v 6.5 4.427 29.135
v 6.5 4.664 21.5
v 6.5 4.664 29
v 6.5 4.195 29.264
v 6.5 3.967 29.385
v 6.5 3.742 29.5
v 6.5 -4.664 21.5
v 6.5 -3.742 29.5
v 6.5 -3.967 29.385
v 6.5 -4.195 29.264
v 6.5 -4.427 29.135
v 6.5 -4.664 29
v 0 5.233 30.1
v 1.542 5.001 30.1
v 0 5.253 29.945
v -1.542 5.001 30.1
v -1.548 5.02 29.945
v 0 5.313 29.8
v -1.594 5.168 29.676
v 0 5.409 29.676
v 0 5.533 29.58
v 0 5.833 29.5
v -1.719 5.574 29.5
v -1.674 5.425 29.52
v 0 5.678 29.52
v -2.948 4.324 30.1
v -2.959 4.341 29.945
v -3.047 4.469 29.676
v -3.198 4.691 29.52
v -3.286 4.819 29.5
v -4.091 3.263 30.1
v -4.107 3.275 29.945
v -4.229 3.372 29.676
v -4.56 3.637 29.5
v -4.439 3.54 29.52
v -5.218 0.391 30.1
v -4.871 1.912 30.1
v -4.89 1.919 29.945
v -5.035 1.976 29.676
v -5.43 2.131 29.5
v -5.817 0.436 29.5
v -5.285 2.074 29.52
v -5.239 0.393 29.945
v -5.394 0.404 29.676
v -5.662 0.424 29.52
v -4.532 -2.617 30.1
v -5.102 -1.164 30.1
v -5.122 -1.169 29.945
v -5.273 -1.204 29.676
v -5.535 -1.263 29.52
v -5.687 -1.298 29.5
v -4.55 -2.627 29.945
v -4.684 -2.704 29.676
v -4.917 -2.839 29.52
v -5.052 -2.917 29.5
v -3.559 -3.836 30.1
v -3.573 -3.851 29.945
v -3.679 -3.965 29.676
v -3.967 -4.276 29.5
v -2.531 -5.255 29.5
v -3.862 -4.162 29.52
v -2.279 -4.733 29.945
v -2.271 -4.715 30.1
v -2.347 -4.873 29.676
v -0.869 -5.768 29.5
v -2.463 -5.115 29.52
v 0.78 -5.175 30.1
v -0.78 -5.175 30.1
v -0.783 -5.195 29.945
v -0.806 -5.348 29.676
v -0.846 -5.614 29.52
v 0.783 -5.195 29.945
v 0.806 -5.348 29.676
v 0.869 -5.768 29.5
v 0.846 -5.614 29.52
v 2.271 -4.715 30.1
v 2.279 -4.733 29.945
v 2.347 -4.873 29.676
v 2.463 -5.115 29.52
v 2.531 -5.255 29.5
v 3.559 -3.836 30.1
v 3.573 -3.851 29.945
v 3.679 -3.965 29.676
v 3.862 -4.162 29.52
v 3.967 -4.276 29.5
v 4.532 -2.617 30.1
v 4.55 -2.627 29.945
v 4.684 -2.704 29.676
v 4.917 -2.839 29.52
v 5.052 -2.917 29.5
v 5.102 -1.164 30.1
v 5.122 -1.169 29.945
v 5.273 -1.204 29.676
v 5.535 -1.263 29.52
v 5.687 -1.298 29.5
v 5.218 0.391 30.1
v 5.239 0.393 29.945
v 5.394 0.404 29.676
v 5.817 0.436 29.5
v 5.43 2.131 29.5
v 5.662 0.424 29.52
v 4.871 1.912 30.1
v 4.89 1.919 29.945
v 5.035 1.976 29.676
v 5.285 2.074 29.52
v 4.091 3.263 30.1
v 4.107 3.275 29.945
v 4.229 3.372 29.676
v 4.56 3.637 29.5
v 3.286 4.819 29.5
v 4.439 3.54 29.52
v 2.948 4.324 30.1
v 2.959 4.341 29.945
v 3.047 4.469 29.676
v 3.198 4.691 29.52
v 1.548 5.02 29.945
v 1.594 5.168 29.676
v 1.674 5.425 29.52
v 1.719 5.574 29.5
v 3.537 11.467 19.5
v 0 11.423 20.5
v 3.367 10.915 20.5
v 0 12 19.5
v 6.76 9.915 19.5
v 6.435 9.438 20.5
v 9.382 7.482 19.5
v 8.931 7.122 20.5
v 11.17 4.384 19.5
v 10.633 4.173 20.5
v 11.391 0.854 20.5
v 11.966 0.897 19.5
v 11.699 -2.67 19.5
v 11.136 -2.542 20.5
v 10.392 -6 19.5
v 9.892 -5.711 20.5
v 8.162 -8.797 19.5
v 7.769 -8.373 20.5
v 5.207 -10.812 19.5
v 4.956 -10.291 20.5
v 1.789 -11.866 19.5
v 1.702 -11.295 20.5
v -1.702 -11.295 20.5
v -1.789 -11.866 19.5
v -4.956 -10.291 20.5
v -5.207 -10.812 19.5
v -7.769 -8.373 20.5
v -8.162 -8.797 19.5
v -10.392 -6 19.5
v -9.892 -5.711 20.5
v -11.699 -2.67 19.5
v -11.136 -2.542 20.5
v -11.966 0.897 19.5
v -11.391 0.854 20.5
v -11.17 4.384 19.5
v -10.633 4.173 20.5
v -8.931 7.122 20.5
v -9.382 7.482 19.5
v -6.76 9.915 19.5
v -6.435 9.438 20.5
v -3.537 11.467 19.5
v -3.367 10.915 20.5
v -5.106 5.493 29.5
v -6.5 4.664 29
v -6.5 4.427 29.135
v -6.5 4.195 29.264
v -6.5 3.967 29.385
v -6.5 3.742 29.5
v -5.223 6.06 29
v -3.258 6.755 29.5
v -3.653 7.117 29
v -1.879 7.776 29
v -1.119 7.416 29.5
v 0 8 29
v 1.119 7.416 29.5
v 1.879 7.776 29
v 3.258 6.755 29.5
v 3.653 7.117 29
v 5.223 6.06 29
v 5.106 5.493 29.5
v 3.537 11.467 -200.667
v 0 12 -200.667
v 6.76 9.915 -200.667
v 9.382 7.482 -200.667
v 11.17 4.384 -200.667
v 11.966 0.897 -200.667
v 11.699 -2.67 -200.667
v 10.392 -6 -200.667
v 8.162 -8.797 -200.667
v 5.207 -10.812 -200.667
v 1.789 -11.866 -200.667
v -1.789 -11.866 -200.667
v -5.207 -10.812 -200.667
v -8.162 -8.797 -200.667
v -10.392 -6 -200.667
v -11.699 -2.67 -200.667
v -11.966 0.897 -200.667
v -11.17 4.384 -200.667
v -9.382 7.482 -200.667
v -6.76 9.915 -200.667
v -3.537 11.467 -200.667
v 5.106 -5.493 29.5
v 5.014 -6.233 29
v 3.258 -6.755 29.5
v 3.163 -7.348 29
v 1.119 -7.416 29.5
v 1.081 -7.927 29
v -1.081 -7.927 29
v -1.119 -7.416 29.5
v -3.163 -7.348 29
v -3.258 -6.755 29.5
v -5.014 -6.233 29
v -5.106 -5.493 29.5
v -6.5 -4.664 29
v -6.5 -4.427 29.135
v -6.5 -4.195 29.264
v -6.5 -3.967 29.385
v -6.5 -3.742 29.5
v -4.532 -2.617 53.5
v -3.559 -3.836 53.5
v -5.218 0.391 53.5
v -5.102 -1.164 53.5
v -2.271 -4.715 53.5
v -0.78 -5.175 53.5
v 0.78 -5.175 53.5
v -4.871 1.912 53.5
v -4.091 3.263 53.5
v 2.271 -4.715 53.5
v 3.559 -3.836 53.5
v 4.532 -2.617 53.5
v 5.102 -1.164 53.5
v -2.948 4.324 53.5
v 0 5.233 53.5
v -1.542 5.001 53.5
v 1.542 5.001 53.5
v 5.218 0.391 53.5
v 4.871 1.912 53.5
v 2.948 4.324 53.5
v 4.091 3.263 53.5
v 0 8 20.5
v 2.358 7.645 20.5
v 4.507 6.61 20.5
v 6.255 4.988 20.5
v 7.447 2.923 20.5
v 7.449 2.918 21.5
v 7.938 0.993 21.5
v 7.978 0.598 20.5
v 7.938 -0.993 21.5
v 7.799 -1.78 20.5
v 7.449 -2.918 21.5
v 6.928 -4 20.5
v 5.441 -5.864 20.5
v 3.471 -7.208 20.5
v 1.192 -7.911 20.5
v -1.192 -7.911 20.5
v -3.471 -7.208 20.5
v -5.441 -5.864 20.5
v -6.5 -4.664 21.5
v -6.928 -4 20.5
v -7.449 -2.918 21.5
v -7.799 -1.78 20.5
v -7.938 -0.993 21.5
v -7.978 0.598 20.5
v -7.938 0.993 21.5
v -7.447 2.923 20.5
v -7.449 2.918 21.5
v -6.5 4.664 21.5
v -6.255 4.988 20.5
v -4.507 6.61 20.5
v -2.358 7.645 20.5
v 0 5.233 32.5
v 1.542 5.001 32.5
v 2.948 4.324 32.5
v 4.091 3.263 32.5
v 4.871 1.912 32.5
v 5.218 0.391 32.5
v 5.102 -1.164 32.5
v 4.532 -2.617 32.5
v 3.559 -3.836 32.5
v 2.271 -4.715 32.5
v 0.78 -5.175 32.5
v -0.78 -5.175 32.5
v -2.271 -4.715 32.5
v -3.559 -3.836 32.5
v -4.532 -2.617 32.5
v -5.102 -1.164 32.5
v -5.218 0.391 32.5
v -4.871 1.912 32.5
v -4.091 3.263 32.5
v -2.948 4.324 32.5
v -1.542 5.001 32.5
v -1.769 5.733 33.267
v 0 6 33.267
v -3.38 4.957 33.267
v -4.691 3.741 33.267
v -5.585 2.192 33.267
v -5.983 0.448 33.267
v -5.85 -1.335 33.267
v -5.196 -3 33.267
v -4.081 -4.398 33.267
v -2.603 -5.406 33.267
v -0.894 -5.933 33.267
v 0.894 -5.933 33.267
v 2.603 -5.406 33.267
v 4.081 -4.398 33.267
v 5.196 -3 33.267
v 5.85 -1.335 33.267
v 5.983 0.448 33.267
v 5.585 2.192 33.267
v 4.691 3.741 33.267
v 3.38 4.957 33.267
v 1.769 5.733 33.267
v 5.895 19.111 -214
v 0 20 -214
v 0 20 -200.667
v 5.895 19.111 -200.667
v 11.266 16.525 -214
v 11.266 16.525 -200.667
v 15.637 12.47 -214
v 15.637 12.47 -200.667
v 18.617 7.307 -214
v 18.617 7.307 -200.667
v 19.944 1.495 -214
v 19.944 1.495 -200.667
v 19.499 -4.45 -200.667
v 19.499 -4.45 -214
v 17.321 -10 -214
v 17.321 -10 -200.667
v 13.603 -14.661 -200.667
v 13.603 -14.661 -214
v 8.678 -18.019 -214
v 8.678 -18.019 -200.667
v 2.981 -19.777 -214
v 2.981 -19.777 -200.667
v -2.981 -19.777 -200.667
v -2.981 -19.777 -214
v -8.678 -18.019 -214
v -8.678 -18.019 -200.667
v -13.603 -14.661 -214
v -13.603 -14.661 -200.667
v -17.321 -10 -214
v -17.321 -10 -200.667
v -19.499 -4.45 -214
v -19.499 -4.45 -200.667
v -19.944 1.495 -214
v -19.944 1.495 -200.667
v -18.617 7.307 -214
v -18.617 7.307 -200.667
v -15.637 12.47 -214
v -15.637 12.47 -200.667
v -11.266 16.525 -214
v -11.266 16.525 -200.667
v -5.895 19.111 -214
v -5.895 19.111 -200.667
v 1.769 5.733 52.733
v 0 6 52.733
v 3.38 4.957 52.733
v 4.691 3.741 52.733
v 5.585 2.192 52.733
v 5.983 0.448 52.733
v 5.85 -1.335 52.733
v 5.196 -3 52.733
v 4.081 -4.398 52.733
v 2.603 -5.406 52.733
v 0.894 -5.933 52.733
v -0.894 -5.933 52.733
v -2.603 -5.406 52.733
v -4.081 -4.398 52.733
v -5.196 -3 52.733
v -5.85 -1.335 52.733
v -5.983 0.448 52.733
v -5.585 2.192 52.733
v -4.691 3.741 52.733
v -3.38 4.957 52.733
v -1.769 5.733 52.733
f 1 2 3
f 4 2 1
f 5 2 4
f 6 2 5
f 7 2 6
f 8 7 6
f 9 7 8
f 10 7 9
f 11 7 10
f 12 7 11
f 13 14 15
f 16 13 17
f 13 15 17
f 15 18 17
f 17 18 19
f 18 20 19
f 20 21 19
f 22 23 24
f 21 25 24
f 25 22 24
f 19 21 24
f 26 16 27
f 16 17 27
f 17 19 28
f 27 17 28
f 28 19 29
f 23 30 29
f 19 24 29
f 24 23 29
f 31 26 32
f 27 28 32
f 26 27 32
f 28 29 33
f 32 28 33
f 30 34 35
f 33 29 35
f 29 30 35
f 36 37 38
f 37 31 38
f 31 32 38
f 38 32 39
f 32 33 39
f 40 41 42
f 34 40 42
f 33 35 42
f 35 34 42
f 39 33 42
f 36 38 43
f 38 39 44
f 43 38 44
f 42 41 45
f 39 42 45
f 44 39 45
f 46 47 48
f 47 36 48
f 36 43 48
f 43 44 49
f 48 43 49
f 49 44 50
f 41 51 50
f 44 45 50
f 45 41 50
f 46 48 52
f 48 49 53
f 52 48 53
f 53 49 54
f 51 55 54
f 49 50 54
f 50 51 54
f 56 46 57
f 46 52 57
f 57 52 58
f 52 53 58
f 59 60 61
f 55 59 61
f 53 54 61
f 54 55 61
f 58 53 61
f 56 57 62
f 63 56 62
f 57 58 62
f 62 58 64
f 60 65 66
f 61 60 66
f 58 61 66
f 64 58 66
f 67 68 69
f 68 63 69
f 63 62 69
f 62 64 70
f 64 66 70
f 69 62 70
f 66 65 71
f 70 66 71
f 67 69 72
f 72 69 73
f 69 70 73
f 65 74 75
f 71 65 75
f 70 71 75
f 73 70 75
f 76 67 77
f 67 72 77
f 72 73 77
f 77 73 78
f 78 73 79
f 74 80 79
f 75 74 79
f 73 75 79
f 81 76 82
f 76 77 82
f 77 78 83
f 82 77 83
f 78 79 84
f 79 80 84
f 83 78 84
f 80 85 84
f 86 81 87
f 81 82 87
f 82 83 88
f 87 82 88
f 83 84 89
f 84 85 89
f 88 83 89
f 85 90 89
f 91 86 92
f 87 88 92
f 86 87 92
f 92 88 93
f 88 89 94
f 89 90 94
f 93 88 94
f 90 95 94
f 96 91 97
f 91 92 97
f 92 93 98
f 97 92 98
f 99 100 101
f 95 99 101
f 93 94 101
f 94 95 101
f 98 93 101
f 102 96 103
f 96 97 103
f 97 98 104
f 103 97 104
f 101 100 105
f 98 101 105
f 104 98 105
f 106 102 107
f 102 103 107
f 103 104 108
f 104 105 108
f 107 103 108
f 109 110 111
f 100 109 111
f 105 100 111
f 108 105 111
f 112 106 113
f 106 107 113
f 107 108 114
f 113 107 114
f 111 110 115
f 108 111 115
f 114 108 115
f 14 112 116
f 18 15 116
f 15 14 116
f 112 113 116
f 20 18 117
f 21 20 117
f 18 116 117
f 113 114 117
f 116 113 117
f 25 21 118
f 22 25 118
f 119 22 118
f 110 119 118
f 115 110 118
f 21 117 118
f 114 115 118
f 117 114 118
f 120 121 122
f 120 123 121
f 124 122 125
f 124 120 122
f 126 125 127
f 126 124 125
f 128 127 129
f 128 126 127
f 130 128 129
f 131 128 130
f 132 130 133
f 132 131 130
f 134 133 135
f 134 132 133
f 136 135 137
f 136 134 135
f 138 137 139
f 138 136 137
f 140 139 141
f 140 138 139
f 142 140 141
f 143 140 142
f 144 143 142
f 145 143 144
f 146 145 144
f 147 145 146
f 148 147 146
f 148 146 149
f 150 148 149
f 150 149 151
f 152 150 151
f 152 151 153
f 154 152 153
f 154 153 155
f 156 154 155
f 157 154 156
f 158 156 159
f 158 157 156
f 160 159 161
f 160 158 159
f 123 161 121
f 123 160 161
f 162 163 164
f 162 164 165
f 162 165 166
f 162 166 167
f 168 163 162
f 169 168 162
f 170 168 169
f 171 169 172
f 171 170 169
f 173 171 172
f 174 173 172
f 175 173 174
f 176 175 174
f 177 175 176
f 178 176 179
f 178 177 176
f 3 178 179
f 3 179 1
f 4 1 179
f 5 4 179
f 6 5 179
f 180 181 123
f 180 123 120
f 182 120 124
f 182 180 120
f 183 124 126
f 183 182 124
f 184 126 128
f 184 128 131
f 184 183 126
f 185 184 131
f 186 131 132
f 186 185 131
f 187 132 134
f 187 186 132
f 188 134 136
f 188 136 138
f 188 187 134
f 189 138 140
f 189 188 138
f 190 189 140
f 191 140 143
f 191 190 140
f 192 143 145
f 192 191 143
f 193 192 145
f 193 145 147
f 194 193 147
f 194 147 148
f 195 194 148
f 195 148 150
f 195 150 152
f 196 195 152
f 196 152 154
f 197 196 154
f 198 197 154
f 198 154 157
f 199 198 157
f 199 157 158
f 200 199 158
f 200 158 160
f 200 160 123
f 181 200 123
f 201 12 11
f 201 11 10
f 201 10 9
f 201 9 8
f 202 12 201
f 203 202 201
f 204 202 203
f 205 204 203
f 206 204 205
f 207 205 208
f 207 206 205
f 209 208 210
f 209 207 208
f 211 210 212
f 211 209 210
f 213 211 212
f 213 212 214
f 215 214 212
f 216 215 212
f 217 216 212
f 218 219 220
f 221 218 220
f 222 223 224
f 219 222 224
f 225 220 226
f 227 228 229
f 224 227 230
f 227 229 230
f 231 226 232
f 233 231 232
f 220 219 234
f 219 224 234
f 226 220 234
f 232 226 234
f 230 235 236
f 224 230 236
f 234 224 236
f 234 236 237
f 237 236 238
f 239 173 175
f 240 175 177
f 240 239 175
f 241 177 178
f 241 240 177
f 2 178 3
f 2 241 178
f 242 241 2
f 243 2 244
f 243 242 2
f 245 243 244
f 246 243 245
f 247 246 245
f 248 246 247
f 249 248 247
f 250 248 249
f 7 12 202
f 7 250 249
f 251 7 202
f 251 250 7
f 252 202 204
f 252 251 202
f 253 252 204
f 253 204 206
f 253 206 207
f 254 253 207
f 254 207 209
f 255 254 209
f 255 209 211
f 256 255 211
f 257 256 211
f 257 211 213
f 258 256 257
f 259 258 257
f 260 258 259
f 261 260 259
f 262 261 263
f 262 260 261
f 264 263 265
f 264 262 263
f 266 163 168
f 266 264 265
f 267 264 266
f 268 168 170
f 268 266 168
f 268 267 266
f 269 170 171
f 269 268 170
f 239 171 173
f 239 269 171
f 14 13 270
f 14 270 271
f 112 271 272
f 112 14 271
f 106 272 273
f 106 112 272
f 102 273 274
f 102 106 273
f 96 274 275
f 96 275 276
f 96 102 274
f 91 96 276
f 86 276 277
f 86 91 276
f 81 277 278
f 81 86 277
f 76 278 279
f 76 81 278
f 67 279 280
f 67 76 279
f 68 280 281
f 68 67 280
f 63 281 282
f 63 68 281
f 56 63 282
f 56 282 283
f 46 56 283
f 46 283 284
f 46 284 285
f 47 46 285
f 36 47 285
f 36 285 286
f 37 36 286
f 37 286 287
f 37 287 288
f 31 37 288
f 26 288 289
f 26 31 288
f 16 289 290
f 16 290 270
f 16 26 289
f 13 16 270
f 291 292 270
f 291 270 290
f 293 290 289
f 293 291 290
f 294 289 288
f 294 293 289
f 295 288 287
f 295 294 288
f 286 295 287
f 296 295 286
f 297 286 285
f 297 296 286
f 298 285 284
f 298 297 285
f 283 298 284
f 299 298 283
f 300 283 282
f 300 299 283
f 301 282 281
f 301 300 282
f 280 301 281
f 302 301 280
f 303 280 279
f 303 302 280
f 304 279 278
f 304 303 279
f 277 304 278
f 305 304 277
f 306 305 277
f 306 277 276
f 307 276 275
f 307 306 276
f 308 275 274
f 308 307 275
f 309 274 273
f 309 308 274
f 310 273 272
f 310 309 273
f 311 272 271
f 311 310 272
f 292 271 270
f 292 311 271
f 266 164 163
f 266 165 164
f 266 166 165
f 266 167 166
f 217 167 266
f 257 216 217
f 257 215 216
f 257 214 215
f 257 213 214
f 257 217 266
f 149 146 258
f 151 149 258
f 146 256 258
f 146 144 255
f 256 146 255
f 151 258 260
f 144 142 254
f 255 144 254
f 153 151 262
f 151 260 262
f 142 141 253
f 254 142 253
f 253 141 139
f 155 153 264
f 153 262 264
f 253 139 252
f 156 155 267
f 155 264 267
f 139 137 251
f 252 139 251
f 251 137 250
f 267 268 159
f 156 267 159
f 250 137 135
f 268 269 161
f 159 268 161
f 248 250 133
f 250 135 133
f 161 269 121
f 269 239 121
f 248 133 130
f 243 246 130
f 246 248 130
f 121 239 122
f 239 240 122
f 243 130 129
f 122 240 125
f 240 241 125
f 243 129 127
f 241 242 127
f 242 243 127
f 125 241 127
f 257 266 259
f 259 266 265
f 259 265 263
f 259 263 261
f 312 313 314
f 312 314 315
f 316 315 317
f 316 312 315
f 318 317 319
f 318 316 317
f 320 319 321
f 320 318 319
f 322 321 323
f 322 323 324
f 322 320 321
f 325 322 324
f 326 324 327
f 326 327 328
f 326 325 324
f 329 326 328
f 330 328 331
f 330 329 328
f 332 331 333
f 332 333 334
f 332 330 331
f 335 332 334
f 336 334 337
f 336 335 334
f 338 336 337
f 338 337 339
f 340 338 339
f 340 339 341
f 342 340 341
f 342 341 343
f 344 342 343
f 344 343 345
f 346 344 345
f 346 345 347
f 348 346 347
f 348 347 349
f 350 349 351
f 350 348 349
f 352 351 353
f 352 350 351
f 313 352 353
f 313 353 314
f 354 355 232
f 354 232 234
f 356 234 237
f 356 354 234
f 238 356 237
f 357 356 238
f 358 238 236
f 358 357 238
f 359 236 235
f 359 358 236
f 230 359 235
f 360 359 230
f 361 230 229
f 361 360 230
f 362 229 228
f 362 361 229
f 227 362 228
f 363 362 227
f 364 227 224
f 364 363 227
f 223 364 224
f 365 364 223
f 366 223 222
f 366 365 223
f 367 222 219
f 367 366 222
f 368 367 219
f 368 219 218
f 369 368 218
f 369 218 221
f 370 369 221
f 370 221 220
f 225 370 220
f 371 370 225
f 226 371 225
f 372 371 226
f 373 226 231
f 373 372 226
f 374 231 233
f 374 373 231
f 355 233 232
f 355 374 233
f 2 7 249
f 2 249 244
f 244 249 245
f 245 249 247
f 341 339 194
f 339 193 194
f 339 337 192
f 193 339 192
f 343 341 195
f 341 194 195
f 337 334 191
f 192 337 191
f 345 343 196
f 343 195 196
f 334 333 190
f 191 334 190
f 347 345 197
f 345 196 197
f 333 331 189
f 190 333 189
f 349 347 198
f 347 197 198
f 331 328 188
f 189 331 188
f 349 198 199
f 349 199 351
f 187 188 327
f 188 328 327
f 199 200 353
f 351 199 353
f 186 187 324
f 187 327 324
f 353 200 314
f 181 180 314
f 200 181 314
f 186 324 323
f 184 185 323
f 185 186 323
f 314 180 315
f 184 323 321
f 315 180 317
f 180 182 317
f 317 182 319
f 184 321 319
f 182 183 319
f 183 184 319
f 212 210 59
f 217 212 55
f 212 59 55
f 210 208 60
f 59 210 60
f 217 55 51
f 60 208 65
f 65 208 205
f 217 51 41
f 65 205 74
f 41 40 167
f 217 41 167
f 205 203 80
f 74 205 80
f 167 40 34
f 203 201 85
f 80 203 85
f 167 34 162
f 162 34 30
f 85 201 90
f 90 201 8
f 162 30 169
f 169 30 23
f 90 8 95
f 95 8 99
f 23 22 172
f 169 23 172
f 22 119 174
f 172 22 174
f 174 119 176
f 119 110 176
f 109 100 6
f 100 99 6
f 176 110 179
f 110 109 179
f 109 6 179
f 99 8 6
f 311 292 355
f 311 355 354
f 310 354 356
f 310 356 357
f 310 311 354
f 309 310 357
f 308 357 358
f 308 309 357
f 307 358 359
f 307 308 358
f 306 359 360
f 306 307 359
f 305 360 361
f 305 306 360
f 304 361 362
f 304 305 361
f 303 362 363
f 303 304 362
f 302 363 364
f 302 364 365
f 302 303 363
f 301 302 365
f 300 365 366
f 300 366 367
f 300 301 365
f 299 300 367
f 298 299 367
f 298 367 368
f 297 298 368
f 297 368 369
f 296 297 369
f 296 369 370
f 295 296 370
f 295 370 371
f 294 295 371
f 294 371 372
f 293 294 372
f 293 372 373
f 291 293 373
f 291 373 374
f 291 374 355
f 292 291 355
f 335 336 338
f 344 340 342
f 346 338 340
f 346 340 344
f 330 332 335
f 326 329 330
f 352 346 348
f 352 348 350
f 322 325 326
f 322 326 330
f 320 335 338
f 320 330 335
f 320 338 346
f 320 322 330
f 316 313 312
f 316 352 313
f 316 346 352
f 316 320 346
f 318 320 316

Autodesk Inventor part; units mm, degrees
sketch "Sketch_1" plane through (0, 0, 0) normal (1, 0, 0) x (0, 1, 0)
  line L0 (0, -214) -> (0, 29.5)
  line L1 (0, 29.5) -> (7.5, 29.5)
  line L2 (7.5, 29.5) -> (8, 29)
  line L3 (8, 29) -> (8, 20.5)
  line L4 (8, 20.5) -> (11.4226, 20.5)
  line L5 (11.4226, 20.5) -> (12, 19.5)
  line L6 (12, 19.5) -> (12, -200.6667)
  line L7 (12, -200.6667) -> (20, -200.6667)
  line L8 (20, -200.6667) -> (20, -214)
  line L9 (20, -214) -> (0, -214)
  line L10 (0, -214) -> (0, 29.5)
revolve "Revolution1" add sketch "Sketch_1" angle 360 about axis through (0, 0, -214) along (0, 0, -1)
sketch "Sketch_3" plane through (0, 0, 0) normal (0, 1, 0) x (-1, 0, 0)
  line L0 (9.5, 21.5) -> (9.5, 32.5)
  line L1 (9.5, 32.5) -> (-9.5, 32.5)
  line L2 (-9.5, 32.5) -> (-9.5, 21.5)
  line L3 (-9.5, 21.5) -> (-6.5, 21.5)
  line L4 (-6.5, 21.5) -> (-6.5, 29.5)
  line L5 (-6.5, 29.5) -> (6.5, 29.5)
  line L6 (6.5, 29.5) -> (6.5, 21.5)
  line L7 (6.5, 21.5) -> (9.5, 21.5)
extrude "Extrusion1" cut sketch "Sketch_3" along normal mid plane 32
sketch "Sketch_2" plane through (0, 0, 0) normal (1, 0, 0) x (0, 1, 0)
  line L0 (0, 29.5) -> (0, 53.5)
  line L1 (0, 53.5) -> (5.233, 53.5)
  line L2 (5.233, 53.5) -> (6, 52.733)
  line L3 (6, 52.733) -> (6, 33.267)
  line L4 (6, 33.267) -> (5.233, 32.5)
  line L5 (5.233, 32.5) -> (5.233, 30.1)
  arc A0 (5.233, 30.1) -> (5.833, 29.5) centre (5.833, 30.1) ccw
  line L6 (5.833, 29.5) -> (0, 29.5)
  line L7 (0, 29.5) -> (0, 53.5)
revolve "Revolution2" add sketch "Sketch_2" angle 360 about axis through (0, 0, 29.5) along (0, 0, -1)
thread "Thread1" size "M12x1.25" class "6g" standard "ISO Metric profile" full length
ref_plane "ANBAU_XY" through (0, 0, -214) normal (0, 0, -1) x (1, 0, 0)
ref_plane "ANBAU_YZ" through (0, 0, -214) normal (1, 0, 0) x (0, -1, 0)
ref_plane "ANBAU_ZX" through (0, 0, -214) normal (0, -1, 0) x (0, 0, -1)
ref_plane "NUT_XY" through (0, 0, 37.5) normal (0, 0, -1) x (1, 0, 0)
ref_plane "NUT_YZ" through (0, 0, 37.5) normal (1, 0, 0) x (0, -1, 0)
ref_plane "NUT_ZX" through (0, 0, 37.5) normal (0, -1, 0) x (0, 0, -1)
properties part number "ESBF-BS-40-100-5P---(KS_0)"
